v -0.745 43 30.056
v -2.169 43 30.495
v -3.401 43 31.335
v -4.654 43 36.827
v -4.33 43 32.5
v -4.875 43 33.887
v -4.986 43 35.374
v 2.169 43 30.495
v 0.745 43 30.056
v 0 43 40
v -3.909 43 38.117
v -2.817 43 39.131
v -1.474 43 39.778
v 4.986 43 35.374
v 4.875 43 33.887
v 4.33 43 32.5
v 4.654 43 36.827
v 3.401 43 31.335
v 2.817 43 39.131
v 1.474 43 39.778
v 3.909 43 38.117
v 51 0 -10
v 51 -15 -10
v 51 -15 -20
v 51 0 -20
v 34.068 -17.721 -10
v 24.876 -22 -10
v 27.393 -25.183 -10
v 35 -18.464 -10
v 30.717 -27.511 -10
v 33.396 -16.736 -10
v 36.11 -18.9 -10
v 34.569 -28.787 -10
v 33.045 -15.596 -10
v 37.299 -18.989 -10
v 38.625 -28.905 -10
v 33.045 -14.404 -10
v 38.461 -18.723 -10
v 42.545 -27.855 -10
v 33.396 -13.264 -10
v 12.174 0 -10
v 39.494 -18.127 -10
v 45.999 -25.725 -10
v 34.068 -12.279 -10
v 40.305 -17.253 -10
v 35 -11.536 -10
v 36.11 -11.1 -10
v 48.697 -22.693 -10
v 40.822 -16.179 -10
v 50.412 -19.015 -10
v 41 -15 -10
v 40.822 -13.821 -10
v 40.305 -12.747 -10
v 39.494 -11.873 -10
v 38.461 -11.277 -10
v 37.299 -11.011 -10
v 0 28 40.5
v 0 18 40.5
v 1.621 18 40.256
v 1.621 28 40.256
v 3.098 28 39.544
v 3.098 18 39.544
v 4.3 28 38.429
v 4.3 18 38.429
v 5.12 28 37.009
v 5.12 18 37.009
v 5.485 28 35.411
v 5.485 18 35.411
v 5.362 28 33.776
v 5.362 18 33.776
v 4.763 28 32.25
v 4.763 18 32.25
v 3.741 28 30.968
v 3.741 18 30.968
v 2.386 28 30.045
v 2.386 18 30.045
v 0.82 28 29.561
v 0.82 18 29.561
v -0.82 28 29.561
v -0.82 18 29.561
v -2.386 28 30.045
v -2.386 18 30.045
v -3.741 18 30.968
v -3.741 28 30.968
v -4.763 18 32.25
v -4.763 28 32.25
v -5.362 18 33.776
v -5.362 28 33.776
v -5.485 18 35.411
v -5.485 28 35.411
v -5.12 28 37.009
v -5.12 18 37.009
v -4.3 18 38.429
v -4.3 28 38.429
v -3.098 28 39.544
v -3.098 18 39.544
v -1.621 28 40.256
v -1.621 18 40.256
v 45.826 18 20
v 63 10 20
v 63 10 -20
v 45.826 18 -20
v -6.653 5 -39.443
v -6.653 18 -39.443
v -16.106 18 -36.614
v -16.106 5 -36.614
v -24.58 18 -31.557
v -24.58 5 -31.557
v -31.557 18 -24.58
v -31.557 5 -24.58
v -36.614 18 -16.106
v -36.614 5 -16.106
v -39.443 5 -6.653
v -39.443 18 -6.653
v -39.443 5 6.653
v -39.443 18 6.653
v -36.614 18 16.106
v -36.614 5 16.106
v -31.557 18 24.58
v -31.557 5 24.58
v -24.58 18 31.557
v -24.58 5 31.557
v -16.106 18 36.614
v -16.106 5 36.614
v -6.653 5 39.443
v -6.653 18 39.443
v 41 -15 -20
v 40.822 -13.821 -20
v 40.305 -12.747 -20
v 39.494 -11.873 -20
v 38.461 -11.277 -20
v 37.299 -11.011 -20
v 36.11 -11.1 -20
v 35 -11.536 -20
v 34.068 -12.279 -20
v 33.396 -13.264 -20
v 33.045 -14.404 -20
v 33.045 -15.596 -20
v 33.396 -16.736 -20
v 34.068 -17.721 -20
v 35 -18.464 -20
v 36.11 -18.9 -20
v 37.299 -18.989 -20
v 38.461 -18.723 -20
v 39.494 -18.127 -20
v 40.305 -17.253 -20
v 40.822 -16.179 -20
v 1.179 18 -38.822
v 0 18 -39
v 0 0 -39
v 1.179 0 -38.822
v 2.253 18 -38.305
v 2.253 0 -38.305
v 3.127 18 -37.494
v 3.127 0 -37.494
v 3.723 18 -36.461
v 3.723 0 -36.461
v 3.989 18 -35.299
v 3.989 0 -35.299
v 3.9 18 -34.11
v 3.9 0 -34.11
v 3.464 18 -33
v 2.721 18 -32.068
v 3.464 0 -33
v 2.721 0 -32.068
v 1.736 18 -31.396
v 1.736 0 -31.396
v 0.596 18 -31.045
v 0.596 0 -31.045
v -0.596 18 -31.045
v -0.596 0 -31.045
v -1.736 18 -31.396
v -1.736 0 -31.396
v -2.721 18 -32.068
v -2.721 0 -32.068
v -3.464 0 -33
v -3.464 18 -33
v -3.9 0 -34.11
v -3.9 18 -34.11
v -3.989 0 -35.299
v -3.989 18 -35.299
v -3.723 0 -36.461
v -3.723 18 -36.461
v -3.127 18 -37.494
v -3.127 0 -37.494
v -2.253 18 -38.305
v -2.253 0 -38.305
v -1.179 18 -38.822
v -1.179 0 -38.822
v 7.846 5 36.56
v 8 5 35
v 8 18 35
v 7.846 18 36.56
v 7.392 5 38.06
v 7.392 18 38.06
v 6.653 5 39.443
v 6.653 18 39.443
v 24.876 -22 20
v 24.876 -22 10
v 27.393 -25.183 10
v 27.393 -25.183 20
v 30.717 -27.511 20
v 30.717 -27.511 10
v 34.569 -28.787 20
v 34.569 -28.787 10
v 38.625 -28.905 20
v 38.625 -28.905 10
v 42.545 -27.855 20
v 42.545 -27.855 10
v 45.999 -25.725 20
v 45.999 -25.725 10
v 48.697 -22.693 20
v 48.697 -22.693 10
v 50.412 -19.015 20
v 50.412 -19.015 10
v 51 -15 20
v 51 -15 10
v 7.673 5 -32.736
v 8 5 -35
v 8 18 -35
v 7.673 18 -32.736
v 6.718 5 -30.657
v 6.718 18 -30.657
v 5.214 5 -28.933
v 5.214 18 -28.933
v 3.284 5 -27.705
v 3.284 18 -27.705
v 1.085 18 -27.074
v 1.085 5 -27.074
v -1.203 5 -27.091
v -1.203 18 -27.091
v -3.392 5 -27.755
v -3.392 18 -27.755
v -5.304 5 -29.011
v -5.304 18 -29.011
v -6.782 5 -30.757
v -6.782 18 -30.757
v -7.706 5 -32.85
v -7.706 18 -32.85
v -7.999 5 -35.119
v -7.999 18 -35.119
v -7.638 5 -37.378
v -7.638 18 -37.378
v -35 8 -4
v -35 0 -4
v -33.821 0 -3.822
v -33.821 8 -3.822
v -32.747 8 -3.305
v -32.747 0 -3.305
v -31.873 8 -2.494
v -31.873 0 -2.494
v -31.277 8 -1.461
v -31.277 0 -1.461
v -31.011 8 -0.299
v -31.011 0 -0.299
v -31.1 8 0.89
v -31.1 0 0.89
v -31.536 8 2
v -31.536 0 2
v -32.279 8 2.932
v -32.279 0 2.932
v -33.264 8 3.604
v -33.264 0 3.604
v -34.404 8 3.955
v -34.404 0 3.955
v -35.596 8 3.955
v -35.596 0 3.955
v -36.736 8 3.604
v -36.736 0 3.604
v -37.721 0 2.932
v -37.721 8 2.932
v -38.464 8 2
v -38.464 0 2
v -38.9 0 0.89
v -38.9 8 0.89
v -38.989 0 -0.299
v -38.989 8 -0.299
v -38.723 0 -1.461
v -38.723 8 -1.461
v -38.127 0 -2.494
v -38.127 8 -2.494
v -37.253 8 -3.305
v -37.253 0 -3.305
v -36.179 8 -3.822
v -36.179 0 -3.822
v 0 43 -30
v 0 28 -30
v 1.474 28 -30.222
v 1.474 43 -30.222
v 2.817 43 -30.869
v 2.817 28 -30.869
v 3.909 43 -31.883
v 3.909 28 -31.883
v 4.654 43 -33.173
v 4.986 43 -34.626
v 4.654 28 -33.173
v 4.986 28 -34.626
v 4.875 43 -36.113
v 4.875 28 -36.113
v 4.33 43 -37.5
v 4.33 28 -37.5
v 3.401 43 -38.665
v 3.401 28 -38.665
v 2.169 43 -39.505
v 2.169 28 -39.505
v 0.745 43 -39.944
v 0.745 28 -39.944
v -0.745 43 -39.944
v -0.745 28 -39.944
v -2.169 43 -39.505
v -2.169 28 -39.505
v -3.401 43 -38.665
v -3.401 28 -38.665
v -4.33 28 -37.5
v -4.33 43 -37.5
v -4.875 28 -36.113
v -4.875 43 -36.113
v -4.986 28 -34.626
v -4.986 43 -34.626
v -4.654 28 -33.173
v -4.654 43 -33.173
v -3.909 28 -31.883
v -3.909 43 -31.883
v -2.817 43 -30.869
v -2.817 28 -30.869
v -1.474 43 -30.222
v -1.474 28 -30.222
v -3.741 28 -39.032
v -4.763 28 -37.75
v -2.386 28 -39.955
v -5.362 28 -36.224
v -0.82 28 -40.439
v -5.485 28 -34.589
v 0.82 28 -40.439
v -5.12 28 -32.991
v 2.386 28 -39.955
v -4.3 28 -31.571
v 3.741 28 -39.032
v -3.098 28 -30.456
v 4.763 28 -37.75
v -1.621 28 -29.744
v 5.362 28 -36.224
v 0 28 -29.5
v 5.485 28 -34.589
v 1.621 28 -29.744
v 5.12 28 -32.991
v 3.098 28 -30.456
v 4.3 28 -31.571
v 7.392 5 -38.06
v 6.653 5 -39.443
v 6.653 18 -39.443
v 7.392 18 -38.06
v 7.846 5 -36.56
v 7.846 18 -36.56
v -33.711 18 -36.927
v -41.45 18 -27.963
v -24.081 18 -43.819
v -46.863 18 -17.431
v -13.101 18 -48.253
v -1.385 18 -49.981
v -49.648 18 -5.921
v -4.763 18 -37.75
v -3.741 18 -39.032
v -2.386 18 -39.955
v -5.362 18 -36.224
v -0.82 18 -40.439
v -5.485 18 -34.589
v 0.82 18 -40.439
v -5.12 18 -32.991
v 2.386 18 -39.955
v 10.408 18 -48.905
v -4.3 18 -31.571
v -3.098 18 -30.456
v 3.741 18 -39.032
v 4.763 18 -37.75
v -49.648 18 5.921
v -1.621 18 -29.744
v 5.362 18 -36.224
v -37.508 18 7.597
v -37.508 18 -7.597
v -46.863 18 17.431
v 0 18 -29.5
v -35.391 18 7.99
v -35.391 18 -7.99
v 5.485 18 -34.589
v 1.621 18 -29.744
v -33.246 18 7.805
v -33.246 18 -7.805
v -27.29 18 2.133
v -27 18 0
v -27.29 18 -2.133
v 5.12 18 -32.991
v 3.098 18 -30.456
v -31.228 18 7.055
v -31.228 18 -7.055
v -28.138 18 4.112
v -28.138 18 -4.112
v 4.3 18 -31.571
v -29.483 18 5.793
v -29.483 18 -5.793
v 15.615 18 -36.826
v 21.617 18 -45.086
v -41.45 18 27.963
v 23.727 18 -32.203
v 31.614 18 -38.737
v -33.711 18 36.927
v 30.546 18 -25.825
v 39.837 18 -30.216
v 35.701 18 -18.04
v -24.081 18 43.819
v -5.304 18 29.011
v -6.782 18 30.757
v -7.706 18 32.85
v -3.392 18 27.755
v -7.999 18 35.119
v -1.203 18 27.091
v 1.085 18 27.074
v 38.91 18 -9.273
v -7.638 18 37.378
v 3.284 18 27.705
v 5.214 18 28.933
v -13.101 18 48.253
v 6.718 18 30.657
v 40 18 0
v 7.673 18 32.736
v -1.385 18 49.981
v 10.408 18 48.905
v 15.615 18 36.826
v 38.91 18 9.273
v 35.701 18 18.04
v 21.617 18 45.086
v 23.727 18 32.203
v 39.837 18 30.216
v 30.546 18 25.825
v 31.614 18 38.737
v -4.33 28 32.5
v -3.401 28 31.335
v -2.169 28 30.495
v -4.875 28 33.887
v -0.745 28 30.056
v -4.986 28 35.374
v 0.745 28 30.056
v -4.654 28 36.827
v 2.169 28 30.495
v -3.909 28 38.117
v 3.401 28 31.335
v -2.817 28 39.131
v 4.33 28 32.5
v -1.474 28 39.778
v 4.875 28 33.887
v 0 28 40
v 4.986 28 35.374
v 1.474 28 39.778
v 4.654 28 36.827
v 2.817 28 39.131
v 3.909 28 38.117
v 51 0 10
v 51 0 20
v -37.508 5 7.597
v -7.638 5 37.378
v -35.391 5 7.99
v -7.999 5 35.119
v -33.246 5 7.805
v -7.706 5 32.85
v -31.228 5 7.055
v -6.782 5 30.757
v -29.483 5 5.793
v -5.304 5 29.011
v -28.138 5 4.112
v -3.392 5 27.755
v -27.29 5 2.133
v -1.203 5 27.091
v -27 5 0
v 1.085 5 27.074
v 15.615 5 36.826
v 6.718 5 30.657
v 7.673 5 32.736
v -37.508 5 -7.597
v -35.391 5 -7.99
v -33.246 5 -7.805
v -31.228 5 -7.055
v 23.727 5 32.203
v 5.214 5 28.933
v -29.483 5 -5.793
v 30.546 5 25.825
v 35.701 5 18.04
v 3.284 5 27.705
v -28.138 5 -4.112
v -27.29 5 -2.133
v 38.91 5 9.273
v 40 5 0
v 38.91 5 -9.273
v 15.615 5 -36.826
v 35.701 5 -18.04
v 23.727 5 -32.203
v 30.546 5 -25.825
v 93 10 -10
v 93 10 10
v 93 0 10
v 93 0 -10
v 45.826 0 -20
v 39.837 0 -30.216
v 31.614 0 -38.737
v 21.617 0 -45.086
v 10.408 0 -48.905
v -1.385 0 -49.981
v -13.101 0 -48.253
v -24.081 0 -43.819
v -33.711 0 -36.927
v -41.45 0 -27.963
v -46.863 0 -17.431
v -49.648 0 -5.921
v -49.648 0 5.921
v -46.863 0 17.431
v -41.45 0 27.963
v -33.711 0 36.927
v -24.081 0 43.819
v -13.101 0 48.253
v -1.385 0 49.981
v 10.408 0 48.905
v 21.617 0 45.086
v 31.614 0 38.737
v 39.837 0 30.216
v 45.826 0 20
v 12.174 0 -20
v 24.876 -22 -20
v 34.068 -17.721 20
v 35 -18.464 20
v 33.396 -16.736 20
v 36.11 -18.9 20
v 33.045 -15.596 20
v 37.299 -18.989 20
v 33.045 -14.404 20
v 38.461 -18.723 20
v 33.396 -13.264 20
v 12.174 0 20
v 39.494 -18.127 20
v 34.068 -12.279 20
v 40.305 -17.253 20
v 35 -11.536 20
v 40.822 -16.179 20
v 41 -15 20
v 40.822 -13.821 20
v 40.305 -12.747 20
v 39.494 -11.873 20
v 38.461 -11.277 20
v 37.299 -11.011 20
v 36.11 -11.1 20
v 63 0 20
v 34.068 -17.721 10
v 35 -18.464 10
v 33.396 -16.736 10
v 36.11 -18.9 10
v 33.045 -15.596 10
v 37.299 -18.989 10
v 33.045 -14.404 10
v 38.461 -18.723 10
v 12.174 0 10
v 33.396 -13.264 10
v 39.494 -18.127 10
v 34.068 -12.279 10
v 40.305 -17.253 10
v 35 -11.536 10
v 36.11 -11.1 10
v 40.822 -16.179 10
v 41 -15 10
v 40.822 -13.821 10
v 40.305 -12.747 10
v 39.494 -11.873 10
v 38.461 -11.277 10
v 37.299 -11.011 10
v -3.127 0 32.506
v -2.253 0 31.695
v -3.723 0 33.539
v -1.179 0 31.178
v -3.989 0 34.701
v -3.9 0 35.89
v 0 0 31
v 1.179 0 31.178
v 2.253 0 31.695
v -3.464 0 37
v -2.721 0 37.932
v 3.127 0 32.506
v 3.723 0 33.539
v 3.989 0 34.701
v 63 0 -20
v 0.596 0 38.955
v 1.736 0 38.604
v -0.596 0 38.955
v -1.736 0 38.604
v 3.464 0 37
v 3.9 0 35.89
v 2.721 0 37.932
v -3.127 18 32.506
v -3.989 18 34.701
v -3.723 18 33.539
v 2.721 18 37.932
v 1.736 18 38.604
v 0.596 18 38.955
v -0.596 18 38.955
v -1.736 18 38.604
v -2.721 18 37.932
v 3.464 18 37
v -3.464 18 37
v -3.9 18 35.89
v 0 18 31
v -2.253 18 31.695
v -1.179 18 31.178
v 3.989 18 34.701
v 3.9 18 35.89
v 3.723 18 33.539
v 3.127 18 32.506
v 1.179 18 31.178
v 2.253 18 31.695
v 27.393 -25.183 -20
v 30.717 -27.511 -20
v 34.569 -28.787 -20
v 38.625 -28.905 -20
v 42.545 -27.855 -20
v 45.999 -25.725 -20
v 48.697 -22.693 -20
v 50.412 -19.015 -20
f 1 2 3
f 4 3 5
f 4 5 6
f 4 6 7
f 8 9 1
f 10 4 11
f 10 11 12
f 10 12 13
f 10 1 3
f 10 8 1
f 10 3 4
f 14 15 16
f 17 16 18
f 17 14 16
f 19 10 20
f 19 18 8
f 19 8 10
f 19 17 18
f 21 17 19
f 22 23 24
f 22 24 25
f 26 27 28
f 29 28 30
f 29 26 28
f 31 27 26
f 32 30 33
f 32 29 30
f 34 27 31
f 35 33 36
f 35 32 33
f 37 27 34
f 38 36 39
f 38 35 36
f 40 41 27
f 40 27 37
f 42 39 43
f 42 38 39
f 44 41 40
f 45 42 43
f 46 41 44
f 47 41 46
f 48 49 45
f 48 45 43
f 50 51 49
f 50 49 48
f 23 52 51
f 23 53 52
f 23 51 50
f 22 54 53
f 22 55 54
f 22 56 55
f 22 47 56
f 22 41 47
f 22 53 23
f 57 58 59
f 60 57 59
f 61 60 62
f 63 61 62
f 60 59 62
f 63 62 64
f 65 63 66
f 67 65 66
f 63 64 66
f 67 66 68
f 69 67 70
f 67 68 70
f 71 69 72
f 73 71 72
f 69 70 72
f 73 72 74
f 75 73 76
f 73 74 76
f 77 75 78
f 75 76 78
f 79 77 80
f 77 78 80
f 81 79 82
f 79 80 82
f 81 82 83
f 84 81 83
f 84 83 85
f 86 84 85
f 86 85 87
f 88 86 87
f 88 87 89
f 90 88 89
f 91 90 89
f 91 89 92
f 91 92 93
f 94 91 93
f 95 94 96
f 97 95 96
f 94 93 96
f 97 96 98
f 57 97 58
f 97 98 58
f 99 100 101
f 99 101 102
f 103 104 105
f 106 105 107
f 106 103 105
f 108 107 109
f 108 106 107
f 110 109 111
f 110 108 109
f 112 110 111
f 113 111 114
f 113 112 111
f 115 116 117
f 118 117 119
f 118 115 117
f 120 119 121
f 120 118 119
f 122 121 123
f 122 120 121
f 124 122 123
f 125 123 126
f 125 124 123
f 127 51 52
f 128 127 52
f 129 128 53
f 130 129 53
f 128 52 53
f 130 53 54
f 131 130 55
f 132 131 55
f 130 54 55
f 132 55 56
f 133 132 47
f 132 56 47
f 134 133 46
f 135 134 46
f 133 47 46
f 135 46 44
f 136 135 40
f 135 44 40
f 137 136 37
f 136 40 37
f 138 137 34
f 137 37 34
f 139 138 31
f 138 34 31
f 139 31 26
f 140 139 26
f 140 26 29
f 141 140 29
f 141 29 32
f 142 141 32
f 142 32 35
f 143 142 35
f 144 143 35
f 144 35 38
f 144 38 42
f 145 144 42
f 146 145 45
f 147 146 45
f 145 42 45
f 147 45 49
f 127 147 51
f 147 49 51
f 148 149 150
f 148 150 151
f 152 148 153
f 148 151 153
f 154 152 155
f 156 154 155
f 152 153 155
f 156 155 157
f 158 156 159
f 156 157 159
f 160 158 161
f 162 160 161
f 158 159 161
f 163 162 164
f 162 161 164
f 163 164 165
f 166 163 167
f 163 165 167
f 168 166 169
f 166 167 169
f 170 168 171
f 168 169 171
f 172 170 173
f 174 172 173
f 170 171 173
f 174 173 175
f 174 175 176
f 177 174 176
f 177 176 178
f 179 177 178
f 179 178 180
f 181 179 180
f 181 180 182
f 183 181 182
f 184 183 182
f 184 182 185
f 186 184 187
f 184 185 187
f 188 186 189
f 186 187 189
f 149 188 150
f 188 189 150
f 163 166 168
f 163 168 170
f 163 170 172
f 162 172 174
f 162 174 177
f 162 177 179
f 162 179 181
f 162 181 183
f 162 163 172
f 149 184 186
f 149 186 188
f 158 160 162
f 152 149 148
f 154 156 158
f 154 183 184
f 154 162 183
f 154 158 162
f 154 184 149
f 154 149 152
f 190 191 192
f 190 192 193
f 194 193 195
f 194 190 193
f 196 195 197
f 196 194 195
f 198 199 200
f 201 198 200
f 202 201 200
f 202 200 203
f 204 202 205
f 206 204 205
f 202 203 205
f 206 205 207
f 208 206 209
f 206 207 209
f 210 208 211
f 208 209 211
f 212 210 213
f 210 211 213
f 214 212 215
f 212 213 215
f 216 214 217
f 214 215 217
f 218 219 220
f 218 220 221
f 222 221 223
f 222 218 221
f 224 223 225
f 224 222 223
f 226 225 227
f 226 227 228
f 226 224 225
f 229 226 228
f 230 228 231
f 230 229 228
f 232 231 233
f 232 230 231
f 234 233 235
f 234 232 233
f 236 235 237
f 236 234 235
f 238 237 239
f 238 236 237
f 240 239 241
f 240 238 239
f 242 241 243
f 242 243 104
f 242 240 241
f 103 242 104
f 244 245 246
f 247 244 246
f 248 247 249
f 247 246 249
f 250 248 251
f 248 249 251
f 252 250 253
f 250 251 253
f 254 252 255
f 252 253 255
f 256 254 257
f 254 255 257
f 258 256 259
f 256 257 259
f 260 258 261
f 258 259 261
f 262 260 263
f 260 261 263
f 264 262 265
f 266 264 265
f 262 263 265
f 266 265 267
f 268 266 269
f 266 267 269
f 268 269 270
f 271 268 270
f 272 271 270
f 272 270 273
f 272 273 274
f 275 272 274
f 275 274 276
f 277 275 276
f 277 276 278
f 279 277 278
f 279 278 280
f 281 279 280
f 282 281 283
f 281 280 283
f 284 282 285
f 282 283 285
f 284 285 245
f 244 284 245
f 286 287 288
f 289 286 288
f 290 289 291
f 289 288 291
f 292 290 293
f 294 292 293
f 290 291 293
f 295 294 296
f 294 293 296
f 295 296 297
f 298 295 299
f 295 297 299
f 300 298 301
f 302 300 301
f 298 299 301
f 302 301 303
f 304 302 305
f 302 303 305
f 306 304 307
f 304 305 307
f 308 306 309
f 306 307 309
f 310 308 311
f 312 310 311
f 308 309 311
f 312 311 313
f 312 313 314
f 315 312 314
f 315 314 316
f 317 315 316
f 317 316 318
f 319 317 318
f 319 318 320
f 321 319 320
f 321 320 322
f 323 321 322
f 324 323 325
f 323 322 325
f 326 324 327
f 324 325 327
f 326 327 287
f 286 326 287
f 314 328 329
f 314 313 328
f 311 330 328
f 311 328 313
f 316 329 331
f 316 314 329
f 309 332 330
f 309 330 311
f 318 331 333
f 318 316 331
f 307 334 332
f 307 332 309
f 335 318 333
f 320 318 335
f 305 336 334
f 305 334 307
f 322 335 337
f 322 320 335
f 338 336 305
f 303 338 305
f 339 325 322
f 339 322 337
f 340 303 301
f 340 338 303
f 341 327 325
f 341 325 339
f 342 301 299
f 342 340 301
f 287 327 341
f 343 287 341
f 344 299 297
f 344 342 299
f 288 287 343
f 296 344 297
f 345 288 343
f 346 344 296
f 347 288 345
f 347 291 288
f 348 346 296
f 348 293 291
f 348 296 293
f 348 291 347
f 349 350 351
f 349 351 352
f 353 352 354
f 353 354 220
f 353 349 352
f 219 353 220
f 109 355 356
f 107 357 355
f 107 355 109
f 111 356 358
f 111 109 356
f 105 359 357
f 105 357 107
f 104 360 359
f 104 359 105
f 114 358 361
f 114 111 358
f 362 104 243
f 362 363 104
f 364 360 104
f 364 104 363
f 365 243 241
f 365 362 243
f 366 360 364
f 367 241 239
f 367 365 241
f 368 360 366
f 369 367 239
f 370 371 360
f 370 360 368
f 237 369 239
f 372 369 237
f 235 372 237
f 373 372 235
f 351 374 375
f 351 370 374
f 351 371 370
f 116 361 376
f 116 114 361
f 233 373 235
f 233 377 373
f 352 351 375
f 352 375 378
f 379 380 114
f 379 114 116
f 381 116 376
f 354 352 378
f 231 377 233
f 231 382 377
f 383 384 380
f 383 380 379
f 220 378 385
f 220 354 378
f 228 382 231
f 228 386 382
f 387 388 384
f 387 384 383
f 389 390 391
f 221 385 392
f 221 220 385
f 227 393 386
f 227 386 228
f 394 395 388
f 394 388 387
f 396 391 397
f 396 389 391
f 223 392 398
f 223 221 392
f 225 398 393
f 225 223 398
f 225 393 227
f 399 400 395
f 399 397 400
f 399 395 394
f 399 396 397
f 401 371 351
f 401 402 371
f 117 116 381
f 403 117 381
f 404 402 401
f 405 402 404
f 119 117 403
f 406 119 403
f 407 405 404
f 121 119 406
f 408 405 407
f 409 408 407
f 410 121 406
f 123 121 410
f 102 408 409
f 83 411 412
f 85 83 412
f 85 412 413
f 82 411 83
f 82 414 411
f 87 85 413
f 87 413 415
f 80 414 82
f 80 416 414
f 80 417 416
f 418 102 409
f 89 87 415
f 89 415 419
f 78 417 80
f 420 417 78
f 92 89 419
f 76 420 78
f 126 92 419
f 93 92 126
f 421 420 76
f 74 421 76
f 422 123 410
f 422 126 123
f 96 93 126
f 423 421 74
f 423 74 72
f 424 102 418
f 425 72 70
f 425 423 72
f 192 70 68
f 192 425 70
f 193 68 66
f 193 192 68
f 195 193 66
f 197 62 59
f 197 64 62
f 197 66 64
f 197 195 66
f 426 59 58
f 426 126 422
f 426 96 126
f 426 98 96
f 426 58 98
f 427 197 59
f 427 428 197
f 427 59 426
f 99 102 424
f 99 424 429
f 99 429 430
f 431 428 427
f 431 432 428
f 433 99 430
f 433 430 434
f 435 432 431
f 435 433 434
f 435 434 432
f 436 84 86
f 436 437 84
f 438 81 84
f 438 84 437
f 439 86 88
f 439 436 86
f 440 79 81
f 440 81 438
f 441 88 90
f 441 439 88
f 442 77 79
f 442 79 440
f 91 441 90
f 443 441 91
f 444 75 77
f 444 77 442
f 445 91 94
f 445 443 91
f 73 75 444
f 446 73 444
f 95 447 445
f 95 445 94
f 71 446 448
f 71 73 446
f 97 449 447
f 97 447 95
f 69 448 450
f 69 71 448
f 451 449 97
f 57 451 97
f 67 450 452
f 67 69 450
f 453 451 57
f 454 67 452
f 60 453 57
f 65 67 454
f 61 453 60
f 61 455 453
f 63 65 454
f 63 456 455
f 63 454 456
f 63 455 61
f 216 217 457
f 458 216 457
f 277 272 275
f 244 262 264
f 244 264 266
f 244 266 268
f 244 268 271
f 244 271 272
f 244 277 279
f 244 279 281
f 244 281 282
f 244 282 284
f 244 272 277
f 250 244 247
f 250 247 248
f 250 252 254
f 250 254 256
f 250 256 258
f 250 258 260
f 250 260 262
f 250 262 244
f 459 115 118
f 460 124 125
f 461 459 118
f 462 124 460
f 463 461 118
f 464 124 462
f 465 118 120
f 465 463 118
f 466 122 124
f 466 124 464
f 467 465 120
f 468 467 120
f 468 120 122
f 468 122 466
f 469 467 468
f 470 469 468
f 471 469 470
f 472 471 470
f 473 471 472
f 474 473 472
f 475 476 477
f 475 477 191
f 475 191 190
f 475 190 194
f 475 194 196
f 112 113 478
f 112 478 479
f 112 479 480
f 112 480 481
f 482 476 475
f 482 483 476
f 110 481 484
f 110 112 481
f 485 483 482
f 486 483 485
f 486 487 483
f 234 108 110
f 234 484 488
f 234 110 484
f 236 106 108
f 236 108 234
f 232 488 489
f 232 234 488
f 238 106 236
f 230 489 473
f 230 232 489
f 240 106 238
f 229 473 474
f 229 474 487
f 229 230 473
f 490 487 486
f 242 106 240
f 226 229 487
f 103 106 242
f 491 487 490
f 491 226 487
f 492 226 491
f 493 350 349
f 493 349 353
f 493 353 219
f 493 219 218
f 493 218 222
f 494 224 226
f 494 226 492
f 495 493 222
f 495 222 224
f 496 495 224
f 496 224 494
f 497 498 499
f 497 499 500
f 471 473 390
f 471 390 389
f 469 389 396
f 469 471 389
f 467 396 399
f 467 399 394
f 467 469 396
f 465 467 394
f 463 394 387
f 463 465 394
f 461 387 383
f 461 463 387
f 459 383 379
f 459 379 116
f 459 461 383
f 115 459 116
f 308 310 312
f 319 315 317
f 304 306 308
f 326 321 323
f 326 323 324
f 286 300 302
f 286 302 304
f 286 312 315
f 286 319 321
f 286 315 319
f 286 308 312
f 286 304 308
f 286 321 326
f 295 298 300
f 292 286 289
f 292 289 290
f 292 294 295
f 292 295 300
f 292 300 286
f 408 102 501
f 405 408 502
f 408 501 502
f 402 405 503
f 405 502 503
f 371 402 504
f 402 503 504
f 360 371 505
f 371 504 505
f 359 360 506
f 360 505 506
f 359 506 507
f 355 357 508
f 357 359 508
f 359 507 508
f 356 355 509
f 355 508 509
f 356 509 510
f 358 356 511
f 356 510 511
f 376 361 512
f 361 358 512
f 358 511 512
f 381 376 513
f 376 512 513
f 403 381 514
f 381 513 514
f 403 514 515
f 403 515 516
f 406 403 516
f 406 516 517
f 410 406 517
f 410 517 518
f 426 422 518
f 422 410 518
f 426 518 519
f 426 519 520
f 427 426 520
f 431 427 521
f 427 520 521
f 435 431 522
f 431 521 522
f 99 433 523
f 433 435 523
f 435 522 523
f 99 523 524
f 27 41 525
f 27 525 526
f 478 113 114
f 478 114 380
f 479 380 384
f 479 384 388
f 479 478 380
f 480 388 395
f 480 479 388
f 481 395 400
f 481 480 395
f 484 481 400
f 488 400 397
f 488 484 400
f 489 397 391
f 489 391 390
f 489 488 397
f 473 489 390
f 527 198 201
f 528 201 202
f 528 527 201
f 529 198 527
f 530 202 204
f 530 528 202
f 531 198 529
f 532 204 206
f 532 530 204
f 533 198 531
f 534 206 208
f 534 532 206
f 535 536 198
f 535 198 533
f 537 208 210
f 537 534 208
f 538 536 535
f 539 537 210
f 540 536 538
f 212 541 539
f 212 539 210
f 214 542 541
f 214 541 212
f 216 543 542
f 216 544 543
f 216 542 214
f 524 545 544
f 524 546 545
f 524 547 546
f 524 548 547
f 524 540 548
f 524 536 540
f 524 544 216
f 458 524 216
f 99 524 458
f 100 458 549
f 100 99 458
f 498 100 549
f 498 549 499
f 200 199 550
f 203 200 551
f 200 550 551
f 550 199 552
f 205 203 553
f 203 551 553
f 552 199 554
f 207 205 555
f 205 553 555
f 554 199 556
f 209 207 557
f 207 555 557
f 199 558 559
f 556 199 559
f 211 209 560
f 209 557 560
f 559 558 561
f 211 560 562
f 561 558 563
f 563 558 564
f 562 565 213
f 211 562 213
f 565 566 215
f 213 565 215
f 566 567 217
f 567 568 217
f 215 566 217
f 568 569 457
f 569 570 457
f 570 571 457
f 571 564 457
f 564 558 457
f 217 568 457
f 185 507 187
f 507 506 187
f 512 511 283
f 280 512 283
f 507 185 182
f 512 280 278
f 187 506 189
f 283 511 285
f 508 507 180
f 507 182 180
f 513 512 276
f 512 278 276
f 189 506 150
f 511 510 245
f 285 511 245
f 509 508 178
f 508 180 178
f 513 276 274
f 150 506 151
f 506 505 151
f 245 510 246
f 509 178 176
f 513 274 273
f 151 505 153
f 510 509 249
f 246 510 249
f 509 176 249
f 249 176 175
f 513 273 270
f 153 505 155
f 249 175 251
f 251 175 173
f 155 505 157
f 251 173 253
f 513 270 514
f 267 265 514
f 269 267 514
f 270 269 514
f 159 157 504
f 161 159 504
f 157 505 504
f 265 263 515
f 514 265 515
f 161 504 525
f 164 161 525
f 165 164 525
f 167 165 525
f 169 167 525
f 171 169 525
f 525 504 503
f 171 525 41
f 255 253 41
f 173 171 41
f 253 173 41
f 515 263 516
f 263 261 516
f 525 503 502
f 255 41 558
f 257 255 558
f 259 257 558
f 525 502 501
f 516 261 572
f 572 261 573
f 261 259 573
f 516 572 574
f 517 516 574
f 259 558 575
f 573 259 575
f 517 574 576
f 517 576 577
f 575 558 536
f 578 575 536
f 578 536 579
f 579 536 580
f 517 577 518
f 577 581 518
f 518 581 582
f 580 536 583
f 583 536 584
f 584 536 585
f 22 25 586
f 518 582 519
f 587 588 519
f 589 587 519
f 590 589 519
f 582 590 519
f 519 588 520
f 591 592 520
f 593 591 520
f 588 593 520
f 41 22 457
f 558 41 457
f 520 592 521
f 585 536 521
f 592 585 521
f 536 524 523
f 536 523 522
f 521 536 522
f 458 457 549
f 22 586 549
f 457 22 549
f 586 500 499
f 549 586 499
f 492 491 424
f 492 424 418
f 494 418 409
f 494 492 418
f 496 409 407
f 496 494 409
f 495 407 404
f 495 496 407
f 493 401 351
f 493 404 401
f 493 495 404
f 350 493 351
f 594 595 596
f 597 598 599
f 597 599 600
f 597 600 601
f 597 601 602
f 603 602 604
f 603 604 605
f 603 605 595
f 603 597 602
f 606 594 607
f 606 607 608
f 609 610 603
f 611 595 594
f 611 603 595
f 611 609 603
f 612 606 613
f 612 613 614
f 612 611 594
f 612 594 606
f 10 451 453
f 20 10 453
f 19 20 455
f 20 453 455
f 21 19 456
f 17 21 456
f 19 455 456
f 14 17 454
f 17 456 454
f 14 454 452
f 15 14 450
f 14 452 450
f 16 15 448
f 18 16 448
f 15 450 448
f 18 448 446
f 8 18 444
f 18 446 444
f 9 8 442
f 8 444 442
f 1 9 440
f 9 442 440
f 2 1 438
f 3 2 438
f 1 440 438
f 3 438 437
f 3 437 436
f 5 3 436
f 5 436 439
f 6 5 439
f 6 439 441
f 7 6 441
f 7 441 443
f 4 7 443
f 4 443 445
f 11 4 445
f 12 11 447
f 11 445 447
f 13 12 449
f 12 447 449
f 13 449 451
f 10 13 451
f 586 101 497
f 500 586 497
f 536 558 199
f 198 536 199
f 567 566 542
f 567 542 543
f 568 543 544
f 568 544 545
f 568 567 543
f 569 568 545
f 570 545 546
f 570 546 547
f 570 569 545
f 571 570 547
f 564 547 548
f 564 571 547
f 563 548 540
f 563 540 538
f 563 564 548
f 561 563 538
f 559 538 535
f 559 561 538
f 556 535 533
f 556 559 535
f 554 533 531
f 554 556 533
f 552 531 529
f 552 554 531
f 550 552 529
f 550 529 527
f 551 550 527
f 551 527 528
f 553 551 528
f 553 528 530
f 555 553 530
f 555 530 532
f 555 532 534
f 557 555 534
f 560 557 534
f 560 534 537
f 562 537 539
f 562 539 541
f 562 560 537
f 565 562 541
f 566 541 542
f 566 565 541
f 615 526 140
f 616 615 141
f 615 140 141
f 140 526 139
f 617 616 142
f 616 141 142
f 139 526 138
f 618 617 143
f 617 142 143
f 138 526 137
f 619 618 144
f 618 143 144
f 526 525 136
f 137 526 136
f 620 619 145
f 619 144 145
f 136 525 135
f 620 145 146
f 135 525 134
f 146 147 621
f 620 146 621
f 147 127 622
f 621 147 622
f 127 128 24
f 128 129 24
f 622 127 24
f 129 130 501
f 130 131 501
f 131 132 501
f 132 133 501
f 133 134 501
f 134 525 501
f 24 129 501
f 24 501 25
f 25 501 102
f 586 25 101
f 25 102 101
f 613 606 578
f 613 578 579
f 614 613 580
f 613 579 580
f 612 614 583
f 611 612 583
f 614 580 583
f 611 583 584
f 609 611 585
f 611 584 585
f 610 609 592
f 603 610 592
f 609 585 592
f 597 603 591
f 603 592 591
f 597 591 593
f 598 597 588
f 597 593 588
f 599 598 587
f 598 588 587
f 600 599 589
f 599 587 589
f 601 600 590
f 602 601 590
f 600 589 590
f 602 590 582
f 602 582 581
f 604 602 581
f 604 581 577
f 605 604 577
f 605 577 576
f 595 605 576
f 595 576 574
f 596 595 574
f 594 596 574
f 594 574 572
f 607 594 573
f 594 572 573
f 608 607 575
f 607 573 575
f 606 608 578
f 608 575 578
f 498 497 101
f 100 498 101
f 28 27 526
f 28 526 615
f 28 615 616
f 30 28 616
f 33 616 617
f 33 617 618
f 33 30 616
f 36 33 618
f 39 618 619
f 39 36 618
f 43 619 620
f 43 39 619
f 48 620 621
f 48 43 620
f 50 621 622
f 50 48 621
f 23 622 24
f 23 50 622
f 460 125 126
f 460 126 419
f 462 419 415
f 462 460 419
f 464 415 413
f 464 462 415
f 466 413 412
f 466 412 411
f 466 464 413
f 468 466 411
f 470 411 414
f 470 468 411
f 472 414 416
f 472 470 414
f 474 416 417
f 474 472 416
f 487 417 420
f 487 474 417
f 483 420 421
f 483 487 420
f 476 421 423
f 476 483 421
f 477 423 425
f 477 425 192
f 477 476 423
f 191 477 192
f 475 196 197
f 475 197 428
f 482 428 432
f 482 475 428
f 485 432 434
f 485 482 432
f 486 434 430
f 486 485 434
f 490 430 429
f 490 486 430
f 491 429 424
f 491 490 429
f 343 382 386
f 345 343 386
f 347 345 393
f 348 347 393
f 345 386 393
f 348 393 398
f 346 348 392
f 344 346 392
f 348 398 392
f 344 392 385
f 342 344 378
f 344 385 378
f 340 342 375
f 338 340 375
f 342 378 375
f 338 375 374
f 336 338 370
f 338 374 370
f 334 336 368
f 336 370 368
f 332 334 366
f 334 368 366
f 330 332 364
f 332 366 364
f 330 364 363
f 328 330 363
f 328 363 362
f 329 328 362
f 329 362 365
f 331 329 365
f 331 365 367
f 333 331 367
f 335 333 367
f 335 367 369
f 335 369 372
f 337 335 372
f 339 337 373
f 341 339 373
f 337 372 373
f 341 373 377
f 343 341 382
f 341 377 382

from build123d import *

# Parameters (mm, degrees)
SKETCH1_R                = 50
BOSS_EXTRUDE1_DEPTH      = 18
CUT_EXTRUDE1_START       = 5
CUT_EXTRUDE1_DEPTH       = 68.965745388
BOSS_EXTRUDE2_START      = 18
SKETCH1_4_R              = 5.5
BOSS_EXTRUDE2_DEPTH      = 10
BOSS_EXTRUDE3_START      = 28
SKETCH1_5_R              = 5
BOSS_EXTRUDE3_DEPTH      = 15
SKETCH3_R                = 4
CUT_EXTRUDE2_DEPTH       = 18
SKETCH3_3_R              = 4
CUT_EXTRUDE3_DEPTH       = 8
BOSS_EXTRUDE4_REACH      = 159.474
BOSS_EXTRUDE4_END_RADIUS = 50
SKETCH5_W                = 40
SKETCH5_H                = 18
CUT_EXTRUDE4_DEPTH       = 125.088677969
CUT_EXTRUDE5_DEPTH       = 111.625494349
BOSS_EXTRUDE5_START      = 10
SKETCH8_R                = 4
BOSS_EXTRUDE5_DEPTH      = 10


with BuildPart() as part:
    # Sketch1 → Boss-Extrude1 (new body)
    with BuildSketch(Plane(origin=(0, 0, 0), x_dir=(1, 0, 0), z_dir=(0, 1, 0))):
        with Locations(Location((0, 0, 0), (0, 0, 270))):
            Circle(SKETCH1_R)
    extrude(amount=BOSS_EXTRUDE1_DEPTH)

    # Sketch1<3> → Cut-Extrude1 (cut, through all)
    with BuildSketch(Plane(origin=(0, 0, 0), x_dir=(1, 0, 0), z_dir=(0, 1, 0)).offset(CUT_EXTRUDE1_START)):
        with BuildLine():
            ThreePointArc((6.652895641, -39.442857143), (30.545996674, -25.825221919), (40, 0))
            ThreePointArc((40, 0), (30.545996674, 25.825221919), (6.652895641, 39.442857143))
            ThreePointArc((6.652895641, 39.442857143), (7.655820176, 37.321296499), (8, 35))
            ThreePointArc((8, 35), (-2.321296499, 27.344179824), (-6.652895641, 39.442857143))
            ThreePointArc((-6.652895641, 39.442857143), (-28.284271247, 28.284271247), (-39.442857143, 6.652895641))
            ThreePointArc((-39.442857143, 6.652895641), (-31.227922134, 7.054886857), (-27, 0))
            ThreePointArc((-27, 0), (-31.227922134, -7.054886857), (-39.442857143, -6.652895641))
            ThreePointArc((-39.442857143, -6.652895641), (-28.284271247, -28.284271247), (-6.652895641, -39.442857143))
            ThreePointArc((-6.652895641, -39.442857143), (-2.321296499, -27.344179824), (8, -35))
            ThreePointArc((8, -35), (7.655820176, -37.321296499), (6.652895641, -39.442857143))
        make_face()
    extrude(amount=CUT_EXTRUDE1_DEPTH, mode=Mode.SUBTRACT)

    # Sketch1<4> → Boss-Extrude2 (add)
    with BuildSketch(Plane(origin=(0, 0, 0), x_dir=(1, 0, 0), z_dir=(0, 1, 0)).offset(BOSS_EXTRUDE2_START)):
        with Locations(Location((0, 35, 0), (0, 0, 270))):
            Circle(SKETCH1_4_R)
        with Locations(Location((0, -35, 0), (0, 0, 270))):
            Circle(SKETCH1_4_R)
    extrude(amount=BOSS_EXTRUDE2_DEPTH)

    # Sketch1<5> → Boss-Extrude3 (add)
    with BuildSketch(Plane(origin=(0, 0, 0), x_dir=(1, 0, 0), z_dir=(0, 1, 0)).offset(BOSS_EXTRUDE3_START)):
        with Locations(Location((0, 35, 0), (0, 0, 270))):
            Circle(SKETCH1_5_R)
        with Locations(Location((0, -35, 0), (0, 0, 270))):
            Circle(SKETCH1_5_R)
    extrude(amount=BOSS_EXTRUDE3_DEPTH)

    # Sketch3 → Cut-Extrude2 (cut)
    with BuildSketch(Plane.XZ):
        with Locations(Location((0, 35, 0), (0, 0, 270))):
            Circle(SKETCH3_R)
        with Locations(Location((0, -35, 0), (0, 0, 270))):
            Circle(SKETCH3_R)
    extrude(amount=-CUT_EXTRUDE2_DEPTH, mode=Mode.SUBTRACT)

    # Sketch3<3> → Cut-Extrude3 (cut)
    with BuildSketch(Plane.XZ):
        with Locations(Location((-35, 0, 0), (0, 0, 270))):
            Circle(SKETCH3_3_R)
    extrude(amount=-CUT_EXTRUDE3_DEPTH, mode=Mode.SUBTRACT)

    # Boss-Extrude4: up to this cylinder (the profile starts outside it)
    boss_extrude4_end = Plane(origin=(0, 9, 0), z_dir=(0, -1, 0)) * Cylinder(BOSS_EXTRUDE4_END_RADIUS, 419.948, mode=Mode.PRIVATE)
    # Sketch5 → Boss-Extrude4 (add, up to the surface)
    with BuildSketch(Plane(origin=(93, 0, 0), x_dir=(0, 0, -1), z_dir=(1, 0, 0)), mode=Mode.PRIVATE) as boss_extrude4_sk1:
        with Locations((0, 9)):
            Rectangle(SKETCH5_W, SKETCH5_H)
    boss_extrude4_tool1 = extrude(boss_extrude4_sk1.sketch, amount=-BOSS_EXTRUDE4_REACH, mode=Mode.PRIVATE) - boss_extrude4_end
    add(boss_extrude4_tool1.solids().sort_by_distance((93, 9, 0))[0])

    # Sketch6 → Cut-Extrude4 (cut, through all)
    with BuildSketch(Plane.XY.offset(20)):
        Polygon((93, 10), (63, 10), (45.82575695, 18), (93, 18), align=None)
    extrude(amount=-CUT_EXTRUDE4_DEPTH, mode=Mode.SUBTRACT)

    # Sketch7 → Cut-Extrude5 (cut, through all)
    with BuildSketch(Plane(origin=(0, 10, 0), x_dir=(1, 0, 0), z_dir=(0, 1, 0))):
        Polygon((63, 20), (93, 10), (93, 20), align=None)
        Polygon((93, -10), (93, -20), (63, -20), align=None)
    extrude(amount=-CUT_EXTRUDE5_DEPTH, mode=Mode.SUBTRACT)

    # Sketch8 → Boss-Extrude5 (add)
    with BuildSketch(Plane.XY.offset(BOSS_EXTRUDE5_START)):
        with BuildLine():
            Line((12.173938425, 0), (24.875644347, -22))
            ThreePointArc((24.875644347, -22), (40.623466631, -28.522961568), (51, -15))
            Line((51, -15), (51, 0))
            Line((51, 0), (12.173938425, 0))
        make_face()
        with Locations((37, -15)):
            Circle(SKETCH8_R, mode=Mode.SUBTRACT)
    boss_extrude5 = extrude(amount=BOSS_EXTRUDE5_DEPTH)

    # Mirror1: Boss-Extrude5 across plane
    add(boss_extrude5.mirror(Plane.XY))


solid = part.part
